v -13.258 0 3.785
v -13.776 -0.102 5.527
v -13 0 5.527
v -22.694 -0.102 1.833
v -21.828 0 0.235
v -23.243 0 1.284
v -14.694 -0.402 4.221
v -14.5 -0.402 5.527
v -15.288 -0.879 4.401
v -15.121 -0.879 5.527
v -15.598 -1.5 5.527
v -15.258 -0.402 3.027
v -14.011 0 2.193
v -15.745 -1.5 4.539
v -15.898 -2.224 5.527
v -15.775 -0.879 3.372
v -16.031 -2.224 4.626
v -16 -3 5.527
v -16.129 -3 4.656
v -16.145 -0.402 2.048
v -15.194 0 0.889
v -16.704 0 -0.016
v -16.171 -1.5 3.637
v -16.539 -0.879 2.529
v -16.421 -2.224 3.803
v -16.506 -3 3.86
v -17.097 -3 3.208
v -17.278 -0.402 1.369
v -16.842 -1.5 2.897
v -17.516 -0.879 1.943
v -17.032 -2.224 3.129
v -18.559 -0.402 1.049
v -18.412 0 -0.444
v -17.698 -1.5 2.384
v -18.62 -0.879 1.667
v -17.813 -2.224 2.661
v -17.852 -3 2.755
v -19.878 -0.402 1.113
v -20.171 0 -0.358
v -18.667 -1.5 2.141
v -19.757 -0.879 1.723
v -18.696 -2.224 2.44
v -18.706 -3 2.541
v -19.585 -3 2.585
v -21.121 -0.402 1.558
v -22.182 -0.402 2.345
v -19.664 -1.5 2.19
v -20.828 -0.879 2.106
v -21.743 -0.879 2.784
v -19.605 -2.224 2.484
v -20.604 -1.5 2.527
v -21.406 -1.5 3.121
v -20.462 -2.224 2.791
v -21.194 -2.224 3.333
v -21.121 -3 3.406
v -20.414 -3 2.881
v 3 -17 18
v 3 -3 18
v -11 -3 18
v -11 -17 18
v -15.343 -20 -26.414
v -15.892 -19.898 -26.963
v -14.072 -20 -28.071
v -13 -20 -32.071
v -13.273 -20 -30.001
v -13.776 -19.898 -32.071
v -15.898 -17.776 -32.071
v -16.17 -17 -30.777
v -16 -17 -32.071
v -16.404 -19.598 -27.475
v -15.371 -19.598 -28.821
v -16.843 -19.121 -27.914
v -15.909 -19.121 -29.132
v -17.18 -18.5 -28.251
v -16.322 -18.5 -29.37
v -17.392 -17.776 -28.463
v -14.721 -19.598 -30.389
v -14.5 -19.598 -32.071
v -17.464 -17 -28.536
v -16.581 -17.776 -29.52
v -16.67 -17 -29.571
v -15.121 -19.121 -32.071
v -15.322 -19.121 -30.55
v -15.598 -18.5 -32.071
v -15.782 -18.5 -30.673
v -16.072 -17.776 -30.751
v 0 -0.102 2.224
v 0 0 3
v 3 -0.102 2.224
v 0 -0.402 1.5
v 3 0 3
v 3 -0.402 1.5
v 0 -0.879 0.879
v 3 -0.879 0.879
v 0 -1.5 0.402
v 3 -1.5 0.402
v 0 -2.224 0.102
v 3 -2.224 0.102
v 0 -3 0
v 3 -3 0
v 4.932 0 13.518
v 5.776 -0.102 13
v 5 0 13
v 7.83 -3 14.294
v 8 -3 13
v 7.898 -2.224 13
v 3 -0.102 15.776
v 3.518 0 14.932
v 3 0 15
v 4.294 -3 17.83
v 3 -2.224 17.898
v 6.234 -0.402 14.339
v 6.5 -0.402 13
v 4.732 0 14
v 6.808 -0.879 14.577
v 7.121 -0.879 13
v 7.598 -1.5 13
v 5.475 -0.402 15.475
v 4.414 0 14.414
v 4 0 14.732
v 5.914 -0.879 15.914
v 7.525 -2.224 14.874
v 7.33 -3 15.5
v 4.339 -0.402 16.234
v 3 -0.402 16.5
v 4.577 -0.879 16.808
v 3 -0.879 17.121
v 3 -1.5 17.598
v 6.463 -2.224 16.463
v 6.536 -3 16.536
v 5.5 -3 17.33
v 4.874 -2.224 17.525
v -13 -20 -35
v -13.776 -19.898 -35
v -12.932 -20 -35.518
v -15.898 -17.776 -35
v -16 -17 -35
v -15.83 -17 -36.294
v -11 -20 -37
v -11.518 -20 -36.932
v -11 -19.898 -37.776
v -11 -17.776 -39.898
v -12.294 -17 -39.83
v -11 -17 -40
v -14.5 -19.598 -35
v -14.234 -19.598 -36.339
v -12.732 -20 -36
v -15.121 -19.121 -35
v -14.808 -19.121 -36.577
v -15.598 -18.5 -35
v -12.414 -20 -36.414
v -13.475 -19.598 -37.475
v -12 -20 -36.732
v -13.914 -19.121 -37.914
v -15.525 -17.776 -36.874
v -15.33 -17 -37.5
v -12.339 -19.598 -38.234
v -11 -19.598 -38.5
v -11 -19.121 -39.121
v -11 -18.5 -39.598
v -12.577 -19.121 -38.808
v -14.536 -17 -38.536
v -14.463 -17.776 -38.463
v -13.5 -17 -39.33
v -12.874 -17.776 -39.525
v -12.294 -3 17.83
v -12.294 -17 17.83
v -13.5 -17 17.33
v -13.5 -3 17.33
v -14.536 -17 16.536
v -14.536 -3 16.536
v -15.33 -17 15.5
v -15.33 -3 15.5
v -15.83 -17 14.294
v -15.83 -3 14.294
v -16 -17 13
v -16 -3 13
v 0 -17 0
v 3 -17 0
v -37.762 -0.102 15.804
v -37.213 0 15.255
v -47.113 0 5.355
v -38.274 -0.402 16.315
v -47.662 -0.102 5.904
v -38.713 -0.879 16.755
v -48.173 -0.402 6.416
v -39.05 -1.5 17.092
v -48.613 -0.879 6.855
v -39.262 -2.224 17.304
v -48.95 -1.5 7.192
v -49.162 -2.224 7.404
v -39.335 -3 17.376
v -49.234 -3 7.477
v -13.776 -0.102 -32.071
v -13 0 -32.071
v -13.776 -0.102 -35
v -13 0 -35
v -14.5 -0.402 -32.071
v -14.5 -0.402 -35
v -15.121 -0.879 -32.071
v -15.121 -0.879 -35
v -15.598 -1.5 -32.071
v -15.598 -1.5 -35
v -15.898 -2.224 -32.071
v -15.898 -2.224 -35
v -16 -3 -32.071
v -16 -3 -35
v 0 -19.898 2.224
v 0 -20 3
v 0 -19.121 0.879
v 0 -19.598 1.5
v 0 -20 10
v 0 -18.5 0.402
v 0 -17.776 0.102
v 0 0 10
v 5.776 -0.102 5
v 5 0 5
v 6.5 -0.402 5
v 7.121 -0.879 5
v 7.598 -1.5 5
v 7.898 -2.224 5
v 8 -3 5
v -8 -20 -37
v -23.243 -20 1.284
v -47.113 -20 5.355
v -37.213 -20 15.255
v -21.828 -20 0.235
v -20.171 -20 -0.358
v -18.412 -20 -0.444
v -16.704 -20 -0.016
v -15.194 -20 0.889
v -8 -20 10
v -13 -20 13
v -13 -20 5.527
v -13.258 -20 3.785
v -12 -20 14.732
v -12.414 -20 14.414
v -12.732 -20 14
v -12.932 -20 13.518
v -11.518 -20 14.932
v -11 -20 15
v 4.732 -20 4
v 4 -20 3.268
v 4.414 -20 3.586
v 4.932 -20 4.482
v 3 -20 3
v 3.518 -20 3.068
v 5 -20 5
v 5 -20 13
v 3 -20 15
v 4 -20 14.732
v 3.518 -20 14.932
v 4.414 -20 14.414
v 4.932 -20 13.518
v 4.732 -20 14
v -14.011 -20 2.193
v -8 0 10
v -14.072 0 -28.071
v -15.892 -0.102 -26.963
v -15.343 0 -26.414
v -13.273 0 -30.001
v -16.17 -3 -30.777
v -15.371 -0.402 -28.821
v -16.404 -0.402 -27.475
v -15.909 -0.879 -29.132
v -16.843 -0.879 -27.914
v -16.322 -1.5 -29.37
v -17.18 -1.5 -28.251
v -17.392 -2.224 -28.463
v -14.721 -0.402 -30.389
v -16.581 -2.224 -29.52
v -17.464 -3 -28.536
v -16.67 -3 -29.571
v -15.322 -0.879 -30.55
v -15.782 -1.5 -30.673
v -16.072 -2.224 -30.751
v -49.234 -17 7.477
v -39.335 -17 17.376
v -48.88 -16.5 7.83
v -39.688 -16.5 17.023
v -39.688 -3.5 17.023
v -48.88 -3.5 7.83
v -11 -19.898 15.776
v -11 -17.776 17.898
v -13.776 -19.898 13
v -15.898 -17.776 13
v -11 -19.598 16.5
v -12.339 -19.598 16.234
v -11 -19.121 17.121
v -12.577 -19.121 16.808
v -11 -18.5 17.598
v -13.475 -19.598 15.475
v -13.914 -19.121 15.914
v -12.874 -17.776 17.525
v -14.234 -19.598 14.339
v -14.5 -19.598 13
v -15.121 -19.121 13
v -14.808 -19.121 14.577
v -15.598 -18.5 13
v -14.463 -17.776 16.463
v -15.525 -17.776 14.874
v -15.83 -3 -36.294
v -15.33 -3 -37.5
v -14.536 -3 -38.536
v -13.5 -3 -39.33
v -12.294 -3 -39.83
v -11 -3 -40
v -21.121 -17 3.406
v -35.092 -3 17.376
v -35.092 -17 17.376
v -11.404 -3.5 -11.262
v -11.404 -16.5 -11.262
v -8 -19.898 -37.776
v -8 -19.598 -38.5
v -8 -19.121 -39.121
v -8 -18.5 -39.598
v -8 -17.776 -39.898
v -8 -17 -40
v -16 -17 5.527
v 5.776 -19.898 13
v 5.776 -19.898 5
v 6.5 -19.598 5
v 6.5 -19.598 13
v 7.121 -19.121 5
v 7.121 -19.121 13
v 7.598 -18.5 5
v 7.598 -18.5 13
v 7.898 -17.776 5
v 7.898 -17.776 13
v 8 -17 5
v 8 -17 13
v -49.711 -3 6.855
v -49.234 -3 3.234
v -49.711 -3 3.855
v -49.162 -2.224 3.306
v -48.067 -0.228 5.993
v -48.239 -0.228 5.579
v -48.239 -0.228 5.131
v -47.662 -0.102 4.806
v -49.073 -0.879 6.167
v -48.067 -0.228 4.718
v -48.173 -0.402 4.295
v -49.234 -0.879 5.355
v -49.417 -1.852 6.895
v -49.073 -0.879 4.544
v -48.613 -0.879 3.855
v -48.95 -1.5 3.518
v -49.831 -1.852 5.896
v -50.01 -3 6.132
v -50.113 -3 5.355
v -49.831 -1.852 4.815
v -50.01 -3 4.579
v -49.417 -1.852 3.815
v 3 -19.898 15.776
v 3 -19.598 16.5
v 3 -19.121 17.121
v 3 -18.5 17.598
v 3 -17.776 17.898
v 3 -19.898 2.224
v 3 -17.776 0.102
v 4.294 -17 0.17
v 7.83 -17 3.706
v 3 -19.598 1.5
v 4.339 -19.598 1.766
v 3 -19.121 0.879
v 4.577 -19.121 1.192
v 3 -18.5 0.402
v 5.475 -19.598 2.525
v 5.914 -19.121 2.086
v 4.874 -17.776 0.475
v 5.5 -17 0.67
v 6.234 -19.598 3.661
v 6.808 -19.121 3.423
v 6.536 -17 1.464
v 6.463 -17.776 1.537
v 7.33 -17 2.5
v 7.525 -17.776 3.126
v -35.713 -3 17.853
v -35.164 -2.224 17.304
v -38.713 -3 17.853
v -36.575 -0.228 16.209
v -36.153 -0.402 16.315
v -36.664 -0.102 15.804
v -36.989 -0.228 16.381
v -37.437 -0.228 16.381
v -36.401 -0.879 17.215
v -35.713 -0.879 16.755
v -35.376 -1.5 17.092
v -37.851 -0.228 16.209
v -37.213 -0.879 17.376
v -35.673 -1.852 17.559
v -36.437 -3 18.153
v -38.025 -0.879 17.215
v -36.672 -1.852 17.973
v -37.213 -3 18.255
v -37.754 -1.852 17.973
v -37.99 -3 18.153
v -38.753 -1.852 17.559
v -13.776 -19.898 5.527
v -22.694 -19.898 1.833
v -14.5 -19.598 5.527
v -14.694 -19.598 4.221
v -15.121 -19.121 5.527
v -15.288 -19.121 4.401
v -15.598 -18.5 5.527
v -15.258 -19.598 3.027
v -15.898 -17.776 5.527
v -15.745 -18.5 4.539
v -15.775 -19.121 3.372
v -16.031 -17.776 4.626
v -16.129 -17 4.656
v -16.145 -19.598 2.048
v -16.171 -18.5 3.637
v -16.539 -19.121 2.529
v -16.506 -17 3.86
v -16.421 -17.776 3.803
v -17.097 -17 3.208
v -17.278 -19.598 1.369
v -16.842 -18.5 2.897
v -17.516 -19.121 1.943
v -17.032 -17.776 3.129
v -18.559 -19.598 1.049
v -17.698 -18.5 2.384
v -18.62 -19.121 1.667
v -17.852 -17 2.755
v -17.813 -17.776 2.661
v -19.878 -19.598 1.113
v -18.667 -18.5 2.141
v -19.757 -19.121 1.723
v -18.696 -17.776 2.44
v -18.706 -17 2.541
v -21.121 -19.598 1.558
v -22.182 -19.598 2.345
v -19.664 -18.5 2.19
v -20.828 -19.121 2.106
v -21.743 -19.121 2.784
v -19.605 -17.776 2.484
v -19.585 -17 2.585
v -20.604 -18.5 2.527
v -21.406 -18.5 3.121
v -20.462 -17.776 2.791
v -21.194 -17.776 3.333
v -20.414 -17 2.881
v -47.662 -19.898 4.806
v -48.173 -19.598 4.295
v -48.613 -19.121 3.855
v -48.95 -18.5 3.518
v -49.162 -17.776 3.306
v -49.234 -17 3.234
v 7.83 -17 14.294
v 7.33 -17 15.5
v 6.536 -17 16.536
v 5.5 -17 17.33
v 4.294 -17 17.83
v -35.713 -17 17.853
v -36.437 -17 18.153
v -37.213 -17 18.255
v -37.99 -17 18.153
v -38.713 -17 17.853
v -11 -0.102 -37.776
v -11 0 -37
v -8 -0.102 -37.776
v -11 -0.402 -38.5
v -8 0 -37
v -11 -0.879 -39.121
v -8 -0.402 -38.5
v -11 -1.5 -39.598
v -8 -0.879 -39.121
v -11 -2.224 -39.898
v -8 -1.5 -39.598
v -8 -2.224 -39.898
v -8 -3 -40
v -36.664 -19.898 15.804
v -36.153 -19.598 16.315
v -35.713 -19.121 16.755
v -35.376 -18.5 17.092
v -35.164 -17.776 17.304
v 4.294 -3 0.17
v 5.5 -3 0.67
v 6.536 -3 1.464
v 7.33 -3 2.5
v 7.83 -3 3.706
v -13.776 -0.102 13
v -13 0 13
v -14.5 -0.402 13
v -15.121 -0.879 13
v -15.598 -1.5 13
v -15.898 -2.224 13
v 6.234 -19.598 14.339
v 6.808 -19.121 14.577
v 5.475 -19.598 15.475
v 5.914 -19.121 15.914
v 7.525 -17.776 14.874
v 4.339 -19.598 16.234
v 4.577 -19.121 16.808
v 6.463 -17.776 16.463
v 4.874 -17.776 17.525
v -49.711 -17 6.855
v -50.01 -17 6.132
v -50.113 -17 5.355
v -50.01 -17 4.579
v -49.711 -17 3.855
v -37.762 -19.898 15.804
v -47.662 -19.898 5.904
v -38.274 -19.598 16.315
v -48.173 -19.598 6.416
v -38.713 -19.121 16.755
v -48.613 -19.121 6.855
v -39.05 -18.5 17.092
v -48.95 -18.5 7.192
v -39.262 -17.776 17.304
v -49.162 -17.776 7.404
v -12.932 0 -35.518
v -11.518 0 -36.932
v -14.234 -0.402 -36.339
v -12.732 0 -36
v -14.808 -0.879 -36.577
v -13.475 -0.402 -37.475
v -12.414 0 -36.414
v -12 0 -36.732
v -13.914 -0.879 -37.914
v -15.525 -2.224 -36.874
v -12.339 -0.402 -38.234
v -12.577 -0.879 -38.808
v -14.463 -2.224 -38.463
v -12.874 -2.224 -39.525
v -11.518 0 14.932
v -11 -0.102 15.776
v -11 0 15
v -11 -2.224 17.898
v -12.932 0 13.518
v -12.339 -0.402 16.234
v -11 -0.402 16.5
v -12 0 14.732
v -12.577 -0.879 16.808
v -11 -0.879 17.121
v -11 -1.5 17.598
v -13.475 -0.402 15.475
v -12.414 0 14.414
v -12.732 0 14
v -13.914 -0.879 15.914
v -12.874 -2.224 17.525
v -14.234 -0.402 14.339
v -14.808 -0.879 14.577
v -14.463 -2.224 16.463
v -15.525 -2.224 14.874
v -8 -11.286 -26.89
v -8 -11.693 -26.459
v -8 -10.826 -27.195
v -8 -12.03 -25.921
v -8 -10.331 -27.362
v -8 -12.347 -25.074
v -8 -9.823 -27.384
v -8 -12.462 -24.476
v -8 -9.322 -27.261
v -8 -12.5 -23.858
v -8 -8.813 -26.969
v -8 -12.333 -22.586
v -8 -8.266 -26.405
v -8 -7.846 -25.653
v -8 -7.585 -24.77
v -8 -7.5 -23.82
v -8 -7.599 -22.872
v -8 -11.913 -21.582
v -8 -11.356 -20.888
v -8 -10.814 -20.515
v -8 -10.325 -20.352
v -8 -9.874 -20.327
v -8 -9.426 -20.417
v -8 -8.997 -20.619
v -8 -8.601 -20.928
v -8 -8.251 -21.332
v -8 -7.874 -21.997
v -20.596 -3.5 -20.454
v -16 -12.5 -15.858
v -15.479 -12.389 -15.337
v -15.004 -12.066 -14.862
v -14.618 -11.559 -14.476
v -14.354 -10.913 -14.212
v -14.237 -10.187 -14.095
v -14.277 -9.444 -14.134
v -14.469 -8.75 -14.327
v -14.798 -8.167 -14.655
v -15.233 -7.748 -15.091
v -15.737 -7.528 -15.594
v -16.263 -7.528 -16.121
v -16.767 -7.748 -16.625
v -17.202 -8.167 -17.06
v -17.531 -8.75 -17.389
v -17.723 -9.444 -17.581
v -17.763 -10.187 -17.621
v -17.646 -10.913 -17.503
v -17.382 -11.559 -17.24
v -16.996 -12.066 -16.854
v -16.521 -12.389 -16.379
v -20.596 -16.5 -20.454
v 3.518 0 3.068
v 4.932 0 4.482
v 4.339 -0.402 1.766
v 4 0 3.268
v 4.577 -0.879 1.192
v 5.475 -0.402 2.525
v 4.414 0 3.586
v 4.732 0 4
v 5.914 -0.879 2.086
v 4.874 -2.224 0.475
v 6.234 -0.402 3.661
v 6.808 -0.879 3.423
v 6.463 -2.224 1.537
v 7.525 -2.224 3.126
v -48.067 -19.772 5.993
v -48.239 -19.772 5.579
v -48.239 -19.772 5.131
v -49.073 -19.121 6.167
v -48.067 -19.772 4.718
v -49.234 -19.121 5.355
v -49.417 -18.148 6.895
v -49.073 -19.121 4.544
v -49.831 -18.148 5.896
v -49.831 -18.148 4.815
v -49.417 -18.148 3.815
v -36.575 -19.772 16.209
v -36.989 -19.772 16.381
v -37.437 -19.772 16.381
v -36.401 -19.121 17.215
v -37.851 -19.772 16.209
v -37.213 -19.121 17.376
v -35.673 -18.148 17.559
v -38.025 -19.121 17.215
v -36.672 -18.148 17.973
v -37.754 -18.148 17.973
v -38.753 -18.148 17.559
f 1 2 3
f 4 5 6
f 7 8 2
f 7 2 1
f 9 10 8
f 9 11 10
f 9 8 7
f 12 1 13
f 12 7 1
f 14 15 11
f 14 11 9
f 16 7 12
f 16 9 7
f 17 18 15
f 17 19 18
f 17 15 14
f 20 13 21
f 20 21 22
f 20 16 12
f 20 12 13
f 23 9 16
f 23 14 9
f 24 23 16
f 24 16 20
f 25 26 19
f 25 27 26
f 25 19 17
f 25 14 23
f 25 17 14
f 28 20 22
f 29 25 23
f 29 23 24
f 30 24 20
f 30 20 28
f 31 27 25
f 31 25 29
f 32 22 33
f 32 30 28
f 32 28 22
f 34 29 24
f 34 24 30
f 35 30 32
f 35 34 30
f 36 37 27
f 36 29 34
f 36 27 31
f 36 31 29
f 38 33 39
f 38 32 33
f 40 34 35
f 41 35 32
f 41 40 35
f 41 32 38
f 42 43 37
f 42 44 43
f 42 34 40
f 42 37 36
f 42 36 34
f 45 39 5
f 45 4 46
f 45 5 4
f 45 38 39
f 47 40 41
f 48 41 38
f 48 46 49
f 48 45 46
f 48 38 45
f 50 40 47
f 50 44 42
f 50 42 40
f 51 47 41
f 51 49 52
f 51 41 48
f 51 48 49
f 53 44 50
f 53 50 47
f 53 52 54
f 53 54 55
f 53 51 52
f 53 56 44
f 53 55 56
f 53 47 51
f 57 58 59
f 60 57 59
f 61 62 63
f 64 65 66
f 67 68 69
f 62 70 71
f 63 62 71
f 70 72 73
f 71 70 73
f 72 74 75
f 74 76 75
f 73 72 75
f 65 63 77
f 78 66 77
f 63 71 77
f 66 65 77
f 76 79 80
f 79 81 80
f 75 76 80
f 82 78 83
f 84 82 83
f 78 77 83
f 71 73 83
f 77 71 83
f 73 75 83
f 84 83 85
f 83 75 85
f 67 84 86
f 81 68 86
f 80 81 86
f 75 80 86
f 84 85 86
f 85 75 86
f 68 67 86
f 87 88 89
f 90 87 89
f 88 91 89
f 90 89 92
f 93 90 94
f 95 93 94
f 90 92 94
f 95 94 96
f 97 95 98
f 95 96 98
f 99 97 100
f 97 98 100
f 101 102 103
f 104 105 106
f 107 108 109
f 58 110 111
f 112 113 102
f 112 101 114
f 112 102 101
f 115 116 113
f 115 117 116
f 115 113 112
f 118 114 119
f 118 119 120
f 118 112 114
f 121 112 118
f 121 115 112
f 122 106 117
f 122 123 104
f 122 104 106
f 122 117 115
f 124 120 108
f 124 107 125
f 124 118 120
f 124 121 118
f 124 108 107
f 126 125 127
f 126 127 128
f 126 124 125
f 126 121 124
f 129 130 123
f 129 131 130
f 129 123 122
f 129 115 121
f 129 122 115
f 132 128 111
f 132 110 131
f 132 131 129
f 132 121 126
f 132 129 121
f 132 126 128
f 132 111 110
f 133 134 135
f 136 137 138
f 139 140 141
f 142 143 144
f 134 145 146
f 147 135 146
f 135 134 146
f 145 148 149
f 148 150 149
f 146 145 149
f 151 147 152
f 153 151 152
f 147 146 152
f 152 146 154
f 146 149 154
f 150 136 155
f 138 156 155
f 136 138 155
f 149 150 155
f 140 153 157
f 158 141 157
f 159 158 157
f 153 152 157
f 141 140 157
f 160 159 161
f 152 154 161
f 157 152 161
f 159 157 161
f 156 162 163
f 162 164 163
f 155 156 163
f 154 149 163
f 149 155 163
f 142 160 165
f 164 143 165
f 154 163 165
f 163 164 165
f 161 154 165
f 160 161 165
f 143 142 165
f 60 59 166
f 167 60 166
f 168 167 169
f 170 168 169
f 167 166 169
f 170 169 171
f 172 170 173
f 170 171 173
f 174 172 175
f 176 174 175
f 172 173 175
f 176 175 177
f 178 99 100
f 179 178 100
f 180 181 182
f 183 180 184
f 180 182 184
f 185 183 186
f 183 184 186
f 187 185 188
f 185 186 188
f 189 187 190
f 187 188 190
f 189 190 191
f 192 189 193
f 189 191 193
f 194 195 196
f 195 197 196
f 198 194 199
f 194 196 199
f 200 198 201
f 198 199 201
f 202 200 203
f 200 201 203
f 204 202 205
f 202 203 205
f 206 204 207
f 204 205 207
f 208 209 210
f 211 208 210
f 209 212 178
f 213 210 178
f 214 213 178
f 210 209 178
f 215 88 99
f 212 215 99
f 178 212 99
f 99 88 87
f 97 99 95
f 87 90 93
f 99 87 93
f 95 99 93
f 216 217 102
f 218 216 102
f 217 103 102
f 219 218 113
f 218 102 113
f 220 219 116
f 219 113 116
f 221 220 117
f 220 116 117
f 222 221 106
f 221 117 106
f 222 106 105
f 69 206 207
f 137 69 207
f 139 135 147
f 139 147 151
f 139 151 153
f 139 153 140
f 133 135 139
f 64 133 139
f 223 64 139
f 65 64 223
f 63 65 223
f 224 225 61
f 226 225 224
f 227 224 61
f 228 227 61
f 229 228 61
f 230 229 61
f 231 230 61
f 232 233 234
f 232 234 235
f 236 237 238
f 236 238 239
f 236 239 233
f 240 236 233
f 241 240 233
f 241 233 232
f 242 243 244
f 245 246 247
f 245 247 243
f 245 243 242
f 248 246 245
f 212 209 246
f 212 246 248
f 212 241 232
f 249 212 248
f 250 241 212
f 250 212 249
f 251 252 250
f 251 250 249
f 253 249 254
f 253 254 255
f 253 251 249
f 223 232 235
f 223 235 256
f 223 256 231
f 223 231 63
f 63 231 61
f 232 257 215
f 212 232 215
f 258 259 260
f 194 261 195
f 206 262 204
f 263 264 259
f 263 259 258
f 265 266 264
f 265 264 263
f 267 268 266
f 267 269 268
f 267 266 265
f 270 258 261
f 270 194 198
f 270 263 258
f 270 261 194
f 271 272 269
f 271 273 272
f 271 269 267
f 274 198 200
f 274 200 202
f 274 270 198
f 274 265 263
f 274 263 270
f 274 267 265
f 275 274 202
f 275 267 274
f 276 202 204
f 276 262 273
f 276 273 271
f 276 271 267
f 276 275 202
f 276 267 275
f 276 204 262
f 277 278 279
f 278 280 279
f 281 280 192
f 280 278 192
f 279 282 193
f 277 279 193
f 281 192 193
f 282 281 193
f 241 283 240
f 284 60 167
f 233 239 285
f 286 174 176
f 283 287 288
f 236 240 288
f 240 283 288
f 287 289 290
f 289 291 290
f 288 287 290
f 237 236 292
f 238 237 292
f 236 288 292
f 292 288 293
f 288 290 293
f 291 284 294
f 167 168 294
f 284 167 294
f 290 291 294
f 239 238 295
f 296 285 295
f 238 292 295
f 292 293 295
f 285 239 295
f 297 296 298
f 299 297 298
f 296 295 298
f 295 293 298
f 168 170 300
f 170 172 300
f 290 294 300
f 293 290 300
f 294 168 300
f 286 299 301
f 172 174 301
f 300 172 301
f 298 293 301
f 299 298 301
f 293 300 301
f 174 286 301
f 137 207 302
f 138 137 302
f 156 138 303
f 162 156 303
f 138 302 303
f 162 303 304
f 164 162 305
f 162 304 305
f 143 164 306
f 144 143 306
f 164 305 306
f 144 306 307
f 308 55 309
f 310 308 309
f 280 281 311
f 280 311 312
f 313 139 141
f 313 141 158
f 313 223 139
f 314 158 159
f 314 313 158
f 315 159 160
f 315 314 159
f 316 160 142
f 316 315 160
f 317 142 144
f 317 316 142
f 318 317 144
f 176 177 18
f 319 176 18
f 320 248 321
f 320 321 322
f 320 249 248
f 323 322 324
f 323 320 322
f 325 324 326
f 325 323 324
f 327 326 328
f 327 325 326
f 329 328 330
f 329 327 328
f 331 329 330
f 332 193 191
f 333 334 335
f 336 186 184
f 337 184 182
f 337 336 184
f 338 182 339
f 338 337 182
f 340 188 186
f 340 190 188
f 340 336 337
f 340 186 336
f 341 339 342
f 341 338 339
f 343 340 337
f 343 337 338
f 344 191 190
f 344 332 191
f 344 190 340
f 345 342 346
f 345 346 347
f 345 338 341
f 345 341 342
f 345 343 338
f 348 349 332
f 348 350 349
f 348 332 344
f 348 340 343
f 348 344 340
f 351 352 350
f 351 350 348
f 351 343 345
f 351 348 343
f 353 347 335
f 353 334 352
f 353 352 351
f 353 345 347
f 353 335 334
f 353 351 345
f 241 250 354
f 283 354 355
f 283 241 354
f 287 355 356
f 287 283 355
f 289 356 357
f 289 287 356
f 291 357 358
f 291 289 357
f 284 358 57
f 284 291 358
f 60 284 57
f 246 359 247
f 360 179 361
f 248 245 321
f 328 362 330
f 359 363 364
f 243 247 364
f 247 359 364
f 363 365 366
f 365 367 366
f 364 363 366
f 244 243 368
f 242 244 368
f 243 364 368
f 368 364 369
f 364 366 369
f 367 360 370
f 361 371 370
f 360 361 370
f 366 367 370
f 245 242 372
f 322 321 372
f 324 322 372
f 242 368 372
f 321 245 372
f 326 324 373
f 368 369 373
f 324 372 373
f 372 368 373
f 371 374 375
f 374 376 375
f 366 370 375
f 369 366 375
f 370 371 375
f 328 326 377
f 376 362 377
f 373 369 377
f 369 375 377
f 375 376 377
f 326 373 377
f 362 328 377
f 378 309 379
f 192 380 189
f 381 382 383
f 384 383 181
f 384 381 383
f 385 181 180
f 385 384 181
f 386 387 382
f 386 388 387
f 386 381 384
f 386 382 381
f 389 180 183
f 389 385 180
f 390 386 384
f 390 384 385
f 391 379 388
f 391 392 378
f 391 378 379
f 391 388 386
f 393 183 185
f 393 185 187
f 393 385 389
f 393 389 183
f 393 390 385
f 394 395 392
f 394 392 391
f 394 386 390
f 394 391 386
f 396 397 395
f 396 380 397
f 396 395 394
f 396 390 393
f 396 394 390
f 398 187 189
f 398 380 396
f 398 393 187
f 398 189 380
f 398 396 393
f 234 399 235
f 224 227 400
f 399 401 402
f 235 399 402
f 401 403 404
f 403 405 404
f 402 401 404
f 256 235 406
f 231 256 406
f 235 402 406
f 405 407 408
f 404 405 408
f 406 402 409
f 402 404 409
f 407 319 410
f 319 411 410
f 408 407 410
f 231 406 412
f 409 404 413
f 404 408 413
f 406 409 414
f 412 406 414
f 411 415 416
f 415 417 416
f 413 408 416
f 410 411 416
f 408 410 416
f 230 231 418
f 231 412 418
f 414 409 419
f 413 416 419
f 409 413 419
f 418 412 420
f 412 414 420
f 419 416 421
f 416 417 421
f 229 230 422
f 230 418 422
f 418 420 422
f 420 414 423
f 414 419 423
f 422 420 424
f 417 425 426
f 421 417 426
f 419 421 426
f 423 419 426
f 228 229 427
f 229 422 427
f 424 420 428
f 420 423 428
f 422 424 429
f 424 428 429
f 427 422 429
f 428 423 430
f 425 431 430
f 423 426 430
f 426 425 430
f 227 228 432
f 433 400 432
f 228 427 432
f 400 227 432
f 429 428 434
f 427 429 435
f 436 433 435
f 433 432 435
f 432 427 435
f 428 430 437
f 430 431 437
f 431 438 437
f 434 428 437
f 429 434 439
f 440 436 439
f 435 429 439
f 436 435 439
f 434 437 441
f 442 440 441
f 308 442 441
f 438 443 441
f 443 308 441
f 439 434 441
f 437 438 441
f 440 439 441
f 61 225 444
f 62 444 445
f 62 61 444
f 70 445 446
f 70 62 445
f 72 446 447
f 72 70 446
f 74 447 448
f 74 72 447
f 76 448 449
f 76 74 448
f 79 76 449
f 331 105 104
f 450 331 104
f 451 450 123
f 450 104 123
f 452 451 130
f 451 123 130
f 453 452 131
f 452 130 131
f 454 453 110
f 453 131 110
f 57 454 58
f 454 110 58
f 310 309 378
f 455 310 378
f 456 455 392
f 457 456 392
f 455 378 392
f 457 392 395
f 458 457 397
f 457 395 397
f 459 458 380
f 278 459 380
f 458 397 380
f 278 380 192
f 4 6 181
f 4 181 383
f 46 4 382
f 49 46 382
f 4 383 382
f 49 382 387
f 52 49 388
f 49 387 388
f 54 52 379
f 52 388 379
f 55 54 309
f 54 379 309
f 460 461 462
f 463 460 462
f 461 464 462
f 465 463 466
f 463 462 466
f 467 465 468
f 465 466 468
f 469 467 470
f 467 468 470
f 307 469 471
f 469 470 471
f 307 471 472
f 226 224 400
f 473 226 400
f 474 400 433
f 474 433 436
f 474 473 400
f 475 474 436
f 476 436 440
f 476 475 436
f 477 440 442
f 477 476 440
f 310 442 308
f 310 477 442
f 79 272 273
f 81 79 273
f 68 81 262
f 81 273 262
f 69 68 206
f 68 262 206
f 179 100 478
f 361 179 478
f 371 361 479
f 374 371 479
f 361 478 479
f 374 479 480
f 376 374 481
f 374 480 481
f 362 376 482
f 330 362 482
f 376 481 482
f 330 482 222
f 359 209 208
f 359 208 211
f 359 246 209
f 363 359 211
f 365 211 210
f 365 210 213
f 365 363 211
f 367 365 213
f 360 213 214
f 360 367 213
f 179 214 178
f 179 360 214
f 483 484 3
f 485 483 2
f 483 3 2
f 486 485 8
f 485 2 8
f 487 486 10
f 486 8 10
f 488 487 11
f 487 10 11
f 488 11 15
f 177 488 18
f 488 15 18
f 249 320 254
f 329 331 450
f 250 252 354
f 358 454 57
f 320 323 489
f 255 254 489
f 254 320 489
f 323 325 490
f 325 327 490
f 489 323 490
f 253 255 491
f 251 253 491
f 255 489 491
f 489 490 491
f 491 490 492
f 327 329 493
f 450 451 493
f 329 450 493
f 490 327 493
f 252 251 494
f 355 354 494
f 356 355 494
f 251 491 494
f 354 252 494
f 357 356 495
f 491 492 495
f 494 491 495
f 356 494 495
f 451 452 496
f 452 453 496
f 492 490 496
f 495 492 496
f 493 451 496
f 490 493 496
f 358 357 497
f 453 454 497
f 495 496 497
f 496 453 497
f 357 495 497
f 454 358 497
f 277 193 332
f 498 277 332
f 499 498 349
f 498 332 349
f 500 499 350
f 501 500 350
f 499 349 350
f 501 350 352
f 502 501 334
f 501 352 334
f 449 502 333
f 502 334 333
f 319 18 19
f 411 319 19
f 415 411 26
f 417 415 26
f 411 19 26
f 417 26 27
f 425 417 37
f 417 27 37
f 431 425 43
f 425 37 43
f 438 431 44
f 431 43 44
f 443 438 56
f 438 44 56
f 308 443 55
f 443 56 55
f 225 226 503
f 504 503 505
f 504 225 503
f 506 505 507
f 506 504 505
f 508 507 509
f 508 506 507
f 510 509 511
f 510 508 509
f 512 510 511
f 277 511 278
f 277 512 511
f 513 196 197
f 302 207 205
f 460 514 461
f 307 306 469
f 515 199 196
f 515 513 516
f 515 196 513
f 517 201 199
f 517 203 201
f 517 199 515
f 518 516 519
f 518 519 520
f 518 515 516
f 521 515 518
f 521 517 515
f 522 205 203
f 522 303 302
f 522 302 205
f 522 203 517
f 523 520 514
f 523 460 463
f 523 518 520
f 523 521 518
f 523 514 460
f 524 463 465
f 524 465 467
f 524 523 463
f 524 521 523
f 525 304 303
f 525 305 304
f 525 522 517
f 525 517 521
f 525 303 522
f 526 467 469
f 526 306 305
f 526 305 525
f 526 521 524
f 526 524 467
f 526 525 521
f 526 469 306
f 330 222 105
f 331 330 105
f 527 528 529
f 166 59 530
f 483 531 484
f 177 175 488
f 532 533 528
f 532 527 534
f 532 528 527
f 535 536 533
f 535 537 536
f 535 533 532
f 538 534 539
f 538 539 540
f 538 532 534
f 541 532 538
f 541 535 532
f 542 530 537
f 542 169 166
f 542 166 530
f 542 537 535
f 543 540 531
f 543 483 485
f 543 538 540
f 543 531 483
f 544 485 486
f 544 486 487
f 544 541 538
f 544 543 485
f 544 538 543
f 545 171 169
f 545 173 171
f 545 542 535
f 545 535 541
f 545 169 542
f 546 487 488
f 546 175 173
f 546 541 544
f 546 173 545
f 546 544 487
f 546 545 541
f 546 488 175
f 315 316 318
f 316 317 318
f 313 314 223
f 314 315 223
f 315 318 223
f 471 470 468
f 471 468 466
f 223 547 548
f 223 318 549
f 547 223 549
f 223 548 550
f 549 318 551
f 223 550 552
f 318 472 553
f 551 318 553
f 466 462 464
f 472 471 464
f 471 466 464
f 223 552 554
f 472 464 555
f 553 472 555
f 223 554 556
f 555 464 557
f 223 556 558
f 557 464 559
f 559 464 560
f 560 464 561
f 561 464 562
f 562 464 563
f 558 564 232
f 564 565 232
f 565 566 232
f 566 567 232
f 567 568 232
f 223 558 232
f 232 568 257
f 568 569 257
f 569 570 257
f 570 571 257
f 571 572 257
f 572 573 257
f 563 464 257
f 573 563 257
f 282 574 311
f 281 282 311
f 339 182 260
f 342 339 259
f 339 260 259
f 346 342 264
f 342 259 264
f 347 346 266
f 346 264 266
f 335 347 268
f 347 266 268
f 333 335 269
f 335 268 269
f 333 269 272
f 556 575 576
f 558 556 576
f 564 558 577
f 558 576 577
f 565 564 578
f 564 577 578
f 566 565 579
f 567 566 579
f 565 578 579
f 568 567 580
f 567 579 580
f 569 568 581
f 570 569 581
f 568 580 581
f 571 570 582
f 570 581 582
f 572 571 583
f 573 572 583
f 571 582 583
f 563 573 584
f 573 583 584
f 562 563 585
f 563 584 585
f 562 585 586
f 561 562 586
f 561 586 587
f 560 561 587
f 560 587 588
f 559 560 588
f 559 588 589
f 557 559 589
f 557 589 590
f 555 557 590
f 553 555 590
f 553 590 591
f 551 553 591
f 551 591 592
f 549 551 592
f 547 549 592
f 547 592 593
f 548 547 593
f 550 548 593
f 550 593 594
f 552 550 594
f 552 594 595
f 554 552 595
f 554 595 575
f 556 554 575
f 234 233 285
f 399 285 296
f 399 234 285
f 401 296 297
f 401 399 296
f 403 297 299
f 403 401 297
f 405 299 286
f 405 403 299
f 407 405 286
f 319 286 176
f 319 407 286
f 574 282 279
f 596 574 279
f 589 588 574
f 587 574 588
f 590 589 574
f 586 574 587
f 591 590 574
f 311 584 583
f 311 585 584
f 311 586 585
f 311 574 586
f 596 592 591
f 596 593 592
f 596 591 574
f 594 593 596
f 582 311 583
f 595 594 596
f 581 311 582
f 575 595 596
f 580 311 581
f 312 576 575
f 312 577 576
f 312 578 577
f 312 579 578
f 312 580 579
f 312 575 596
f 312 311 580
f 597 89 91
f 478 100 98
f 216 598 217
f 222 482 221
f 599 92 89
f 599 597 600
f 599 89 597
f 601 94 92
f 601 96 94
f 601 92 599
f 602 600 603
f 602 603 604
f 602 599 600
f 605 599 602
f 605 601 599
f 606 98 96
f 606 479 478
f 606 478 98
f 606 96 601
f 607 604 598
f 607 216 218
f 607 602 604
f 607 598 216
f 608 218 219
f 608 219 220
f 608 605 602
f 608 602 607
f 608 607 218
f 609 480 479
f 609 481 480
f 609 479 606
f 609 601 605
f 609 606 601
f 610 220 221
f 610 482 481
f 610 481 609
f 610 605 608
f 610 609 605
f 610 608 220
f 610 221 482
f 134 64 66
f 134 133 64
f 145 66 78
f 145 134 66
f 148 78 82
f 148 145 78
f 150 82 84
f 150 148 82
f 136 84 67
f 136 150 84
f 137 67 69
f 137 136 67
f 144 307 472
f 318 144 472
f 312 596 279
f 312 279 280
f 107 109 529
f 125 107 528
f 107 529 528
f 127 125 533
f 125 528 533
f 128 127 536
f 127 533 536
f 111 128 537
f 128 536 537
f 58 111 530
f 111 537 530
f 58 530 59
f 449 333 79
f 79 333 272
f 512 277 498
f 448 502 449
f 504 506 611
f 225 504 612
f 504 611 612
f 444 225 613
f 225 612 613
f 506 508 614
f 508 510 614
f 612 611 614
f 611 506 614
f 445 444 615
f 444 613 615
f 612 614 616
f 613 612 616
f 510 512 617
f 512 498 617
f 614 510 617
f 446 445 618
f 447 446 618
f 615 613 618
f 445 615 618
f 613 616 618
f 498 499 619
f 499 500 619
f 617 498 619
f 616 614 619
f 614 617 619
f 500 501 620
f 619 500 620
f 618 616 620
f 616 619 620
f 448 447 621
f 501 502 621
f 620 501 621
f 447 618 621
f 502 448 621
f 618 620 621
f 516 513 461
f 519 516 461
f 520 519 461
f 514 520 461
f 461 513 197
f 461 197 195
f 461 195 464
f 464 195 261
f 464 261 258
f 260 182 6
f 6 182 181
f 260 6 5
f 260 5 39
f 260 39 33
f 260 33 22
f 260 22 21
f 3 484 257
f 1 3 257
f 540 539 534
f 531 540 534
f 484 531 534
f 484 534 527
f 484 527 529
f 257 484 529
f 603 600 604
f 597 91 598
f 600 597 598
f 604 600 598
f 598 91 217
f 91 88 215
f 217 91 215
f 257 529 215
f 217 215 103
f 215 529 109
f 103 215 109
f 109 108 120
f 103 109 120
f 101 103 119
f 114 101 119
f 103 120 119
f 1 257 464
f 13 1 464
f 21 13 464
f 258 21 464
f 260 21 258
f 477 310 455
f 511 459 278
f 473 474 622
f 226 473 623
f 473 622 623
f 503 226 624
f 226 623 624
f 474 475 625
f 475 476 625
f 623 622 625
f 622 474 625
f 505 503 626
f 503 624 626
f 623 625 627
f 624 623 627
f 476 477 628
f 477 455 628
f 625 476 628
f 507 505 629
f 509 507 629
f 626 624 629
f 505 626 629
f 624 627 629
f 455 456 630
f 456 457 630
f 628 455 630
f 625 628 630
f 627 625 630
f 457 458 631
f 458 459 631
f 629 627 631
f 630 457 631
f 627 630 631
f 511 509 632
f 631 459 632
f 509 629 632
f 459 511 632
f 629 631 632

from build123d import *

# Parameters (mm, degrees)
F1_DEPTH = 20
F2_W     = 13
F2_H     = 13
F3_DEPTH = 40
F4_R     = 2.5
F5_DEPTH = 14.813708499
F6_R     = 3


with BuildPart() as f1:
    # F0 (on Front) → F1 (new body)
    with BuildSketch(Plane.XZ):
        with BuildLine():
            Line((0, 10), (0, 0))
            Line((0, 0), (3, 0))
            ThreePointArc((3, 0), (6.5355339059, 1.4644660941), (8, 5))
            Line((8, 5), (8, 13))
            ThreePointArc((8, 13), (6.5355339059, 16.5355339059), (3, 18))
            Line((3, 18), (-11, 18))
            ThreePointArc((-11, 18), (-14.5355339059, 16.5355339059), (-16, 13))
            Line((-16, 13), (-16, 5.5269119346))
            ThreePointArc((-16, 5.5269119346), (-17.8519497029, 2.755273337), (-21.1213203436, 3.405591591))
            Line((-21.1213203436, 3.405591591), (-35.091883092, 17.3761543395))
            ThreePointArc((-35.091883092, 17.3761543395), (-37.2132034356, 18.2548339959), (-39.3345237792, 17.3761543395))
            Line((-39.3345237792, 17.3761543395), (-49.2340187158, 7.4766594029))
            ThreePointArc((-49.2340187158, 7.4766594029), (-50.1126983722, 5.3553390593), (-49.2340187158, 3.2340187158))
            Line((-49.2340187158, 3.2340187158), (-17.4644660941, -28.5355339059))
            ThreePointArc((-17.4644660941, -28.5355339059), (-16.3806023374, -30.15765065), (-16, -32.0710678119))
            Line((-16, -32.0710678119), (-16, -35))
            ThreePointArc((-16, -35), (-14.5355339059, -38.5355339059), (-11, -40))
            Line((-11, -40), (-8, -40))
            Line((-8, -40), (-8, 10))
            Line((-8, 10), (0, 10))
        make_face()
    extrude(amount=F1_DEPTH)

    # F2 (on face) → F3 (cut)
    with BuildSketch(Plane(origin=(-28.3553390593, 0, 28.3553390593), x_dir=(0, -1, 0), z_dir=(-0.7071067812, 0, 0.7071067812))):
        with Locations((10, -22.5269119346)):
            Rectangle(F2_W, F2_H)
    extrude(amount=-F3_DEPTH, mode=Mode.SUBTRACT)

    # F4 (on face) → F5 (cut, up to face)
    with BuildSketch(Plane(origin=(-0.0710678119, 0, 0.0710678119), x_dir=(0, -1, 0), z_dir=(-0.7071067812, 0, 0.7071067812))):
        with Locations((10, -22.5269119346)):
            Circle(F4_R)
    extrude(amount=-F5_DEPTH, mode=Mode.SUBTRACT)

    # F6
    f6_edges = [f1.edges().sort_by_distance(p)[0] for p in [
        (-44.284271, -20, 12.426407),
        (-44.284271, 0, 12.426407),
    ]]
    fillet(f6_edges, radius=F6_R)


solid = f1.part
